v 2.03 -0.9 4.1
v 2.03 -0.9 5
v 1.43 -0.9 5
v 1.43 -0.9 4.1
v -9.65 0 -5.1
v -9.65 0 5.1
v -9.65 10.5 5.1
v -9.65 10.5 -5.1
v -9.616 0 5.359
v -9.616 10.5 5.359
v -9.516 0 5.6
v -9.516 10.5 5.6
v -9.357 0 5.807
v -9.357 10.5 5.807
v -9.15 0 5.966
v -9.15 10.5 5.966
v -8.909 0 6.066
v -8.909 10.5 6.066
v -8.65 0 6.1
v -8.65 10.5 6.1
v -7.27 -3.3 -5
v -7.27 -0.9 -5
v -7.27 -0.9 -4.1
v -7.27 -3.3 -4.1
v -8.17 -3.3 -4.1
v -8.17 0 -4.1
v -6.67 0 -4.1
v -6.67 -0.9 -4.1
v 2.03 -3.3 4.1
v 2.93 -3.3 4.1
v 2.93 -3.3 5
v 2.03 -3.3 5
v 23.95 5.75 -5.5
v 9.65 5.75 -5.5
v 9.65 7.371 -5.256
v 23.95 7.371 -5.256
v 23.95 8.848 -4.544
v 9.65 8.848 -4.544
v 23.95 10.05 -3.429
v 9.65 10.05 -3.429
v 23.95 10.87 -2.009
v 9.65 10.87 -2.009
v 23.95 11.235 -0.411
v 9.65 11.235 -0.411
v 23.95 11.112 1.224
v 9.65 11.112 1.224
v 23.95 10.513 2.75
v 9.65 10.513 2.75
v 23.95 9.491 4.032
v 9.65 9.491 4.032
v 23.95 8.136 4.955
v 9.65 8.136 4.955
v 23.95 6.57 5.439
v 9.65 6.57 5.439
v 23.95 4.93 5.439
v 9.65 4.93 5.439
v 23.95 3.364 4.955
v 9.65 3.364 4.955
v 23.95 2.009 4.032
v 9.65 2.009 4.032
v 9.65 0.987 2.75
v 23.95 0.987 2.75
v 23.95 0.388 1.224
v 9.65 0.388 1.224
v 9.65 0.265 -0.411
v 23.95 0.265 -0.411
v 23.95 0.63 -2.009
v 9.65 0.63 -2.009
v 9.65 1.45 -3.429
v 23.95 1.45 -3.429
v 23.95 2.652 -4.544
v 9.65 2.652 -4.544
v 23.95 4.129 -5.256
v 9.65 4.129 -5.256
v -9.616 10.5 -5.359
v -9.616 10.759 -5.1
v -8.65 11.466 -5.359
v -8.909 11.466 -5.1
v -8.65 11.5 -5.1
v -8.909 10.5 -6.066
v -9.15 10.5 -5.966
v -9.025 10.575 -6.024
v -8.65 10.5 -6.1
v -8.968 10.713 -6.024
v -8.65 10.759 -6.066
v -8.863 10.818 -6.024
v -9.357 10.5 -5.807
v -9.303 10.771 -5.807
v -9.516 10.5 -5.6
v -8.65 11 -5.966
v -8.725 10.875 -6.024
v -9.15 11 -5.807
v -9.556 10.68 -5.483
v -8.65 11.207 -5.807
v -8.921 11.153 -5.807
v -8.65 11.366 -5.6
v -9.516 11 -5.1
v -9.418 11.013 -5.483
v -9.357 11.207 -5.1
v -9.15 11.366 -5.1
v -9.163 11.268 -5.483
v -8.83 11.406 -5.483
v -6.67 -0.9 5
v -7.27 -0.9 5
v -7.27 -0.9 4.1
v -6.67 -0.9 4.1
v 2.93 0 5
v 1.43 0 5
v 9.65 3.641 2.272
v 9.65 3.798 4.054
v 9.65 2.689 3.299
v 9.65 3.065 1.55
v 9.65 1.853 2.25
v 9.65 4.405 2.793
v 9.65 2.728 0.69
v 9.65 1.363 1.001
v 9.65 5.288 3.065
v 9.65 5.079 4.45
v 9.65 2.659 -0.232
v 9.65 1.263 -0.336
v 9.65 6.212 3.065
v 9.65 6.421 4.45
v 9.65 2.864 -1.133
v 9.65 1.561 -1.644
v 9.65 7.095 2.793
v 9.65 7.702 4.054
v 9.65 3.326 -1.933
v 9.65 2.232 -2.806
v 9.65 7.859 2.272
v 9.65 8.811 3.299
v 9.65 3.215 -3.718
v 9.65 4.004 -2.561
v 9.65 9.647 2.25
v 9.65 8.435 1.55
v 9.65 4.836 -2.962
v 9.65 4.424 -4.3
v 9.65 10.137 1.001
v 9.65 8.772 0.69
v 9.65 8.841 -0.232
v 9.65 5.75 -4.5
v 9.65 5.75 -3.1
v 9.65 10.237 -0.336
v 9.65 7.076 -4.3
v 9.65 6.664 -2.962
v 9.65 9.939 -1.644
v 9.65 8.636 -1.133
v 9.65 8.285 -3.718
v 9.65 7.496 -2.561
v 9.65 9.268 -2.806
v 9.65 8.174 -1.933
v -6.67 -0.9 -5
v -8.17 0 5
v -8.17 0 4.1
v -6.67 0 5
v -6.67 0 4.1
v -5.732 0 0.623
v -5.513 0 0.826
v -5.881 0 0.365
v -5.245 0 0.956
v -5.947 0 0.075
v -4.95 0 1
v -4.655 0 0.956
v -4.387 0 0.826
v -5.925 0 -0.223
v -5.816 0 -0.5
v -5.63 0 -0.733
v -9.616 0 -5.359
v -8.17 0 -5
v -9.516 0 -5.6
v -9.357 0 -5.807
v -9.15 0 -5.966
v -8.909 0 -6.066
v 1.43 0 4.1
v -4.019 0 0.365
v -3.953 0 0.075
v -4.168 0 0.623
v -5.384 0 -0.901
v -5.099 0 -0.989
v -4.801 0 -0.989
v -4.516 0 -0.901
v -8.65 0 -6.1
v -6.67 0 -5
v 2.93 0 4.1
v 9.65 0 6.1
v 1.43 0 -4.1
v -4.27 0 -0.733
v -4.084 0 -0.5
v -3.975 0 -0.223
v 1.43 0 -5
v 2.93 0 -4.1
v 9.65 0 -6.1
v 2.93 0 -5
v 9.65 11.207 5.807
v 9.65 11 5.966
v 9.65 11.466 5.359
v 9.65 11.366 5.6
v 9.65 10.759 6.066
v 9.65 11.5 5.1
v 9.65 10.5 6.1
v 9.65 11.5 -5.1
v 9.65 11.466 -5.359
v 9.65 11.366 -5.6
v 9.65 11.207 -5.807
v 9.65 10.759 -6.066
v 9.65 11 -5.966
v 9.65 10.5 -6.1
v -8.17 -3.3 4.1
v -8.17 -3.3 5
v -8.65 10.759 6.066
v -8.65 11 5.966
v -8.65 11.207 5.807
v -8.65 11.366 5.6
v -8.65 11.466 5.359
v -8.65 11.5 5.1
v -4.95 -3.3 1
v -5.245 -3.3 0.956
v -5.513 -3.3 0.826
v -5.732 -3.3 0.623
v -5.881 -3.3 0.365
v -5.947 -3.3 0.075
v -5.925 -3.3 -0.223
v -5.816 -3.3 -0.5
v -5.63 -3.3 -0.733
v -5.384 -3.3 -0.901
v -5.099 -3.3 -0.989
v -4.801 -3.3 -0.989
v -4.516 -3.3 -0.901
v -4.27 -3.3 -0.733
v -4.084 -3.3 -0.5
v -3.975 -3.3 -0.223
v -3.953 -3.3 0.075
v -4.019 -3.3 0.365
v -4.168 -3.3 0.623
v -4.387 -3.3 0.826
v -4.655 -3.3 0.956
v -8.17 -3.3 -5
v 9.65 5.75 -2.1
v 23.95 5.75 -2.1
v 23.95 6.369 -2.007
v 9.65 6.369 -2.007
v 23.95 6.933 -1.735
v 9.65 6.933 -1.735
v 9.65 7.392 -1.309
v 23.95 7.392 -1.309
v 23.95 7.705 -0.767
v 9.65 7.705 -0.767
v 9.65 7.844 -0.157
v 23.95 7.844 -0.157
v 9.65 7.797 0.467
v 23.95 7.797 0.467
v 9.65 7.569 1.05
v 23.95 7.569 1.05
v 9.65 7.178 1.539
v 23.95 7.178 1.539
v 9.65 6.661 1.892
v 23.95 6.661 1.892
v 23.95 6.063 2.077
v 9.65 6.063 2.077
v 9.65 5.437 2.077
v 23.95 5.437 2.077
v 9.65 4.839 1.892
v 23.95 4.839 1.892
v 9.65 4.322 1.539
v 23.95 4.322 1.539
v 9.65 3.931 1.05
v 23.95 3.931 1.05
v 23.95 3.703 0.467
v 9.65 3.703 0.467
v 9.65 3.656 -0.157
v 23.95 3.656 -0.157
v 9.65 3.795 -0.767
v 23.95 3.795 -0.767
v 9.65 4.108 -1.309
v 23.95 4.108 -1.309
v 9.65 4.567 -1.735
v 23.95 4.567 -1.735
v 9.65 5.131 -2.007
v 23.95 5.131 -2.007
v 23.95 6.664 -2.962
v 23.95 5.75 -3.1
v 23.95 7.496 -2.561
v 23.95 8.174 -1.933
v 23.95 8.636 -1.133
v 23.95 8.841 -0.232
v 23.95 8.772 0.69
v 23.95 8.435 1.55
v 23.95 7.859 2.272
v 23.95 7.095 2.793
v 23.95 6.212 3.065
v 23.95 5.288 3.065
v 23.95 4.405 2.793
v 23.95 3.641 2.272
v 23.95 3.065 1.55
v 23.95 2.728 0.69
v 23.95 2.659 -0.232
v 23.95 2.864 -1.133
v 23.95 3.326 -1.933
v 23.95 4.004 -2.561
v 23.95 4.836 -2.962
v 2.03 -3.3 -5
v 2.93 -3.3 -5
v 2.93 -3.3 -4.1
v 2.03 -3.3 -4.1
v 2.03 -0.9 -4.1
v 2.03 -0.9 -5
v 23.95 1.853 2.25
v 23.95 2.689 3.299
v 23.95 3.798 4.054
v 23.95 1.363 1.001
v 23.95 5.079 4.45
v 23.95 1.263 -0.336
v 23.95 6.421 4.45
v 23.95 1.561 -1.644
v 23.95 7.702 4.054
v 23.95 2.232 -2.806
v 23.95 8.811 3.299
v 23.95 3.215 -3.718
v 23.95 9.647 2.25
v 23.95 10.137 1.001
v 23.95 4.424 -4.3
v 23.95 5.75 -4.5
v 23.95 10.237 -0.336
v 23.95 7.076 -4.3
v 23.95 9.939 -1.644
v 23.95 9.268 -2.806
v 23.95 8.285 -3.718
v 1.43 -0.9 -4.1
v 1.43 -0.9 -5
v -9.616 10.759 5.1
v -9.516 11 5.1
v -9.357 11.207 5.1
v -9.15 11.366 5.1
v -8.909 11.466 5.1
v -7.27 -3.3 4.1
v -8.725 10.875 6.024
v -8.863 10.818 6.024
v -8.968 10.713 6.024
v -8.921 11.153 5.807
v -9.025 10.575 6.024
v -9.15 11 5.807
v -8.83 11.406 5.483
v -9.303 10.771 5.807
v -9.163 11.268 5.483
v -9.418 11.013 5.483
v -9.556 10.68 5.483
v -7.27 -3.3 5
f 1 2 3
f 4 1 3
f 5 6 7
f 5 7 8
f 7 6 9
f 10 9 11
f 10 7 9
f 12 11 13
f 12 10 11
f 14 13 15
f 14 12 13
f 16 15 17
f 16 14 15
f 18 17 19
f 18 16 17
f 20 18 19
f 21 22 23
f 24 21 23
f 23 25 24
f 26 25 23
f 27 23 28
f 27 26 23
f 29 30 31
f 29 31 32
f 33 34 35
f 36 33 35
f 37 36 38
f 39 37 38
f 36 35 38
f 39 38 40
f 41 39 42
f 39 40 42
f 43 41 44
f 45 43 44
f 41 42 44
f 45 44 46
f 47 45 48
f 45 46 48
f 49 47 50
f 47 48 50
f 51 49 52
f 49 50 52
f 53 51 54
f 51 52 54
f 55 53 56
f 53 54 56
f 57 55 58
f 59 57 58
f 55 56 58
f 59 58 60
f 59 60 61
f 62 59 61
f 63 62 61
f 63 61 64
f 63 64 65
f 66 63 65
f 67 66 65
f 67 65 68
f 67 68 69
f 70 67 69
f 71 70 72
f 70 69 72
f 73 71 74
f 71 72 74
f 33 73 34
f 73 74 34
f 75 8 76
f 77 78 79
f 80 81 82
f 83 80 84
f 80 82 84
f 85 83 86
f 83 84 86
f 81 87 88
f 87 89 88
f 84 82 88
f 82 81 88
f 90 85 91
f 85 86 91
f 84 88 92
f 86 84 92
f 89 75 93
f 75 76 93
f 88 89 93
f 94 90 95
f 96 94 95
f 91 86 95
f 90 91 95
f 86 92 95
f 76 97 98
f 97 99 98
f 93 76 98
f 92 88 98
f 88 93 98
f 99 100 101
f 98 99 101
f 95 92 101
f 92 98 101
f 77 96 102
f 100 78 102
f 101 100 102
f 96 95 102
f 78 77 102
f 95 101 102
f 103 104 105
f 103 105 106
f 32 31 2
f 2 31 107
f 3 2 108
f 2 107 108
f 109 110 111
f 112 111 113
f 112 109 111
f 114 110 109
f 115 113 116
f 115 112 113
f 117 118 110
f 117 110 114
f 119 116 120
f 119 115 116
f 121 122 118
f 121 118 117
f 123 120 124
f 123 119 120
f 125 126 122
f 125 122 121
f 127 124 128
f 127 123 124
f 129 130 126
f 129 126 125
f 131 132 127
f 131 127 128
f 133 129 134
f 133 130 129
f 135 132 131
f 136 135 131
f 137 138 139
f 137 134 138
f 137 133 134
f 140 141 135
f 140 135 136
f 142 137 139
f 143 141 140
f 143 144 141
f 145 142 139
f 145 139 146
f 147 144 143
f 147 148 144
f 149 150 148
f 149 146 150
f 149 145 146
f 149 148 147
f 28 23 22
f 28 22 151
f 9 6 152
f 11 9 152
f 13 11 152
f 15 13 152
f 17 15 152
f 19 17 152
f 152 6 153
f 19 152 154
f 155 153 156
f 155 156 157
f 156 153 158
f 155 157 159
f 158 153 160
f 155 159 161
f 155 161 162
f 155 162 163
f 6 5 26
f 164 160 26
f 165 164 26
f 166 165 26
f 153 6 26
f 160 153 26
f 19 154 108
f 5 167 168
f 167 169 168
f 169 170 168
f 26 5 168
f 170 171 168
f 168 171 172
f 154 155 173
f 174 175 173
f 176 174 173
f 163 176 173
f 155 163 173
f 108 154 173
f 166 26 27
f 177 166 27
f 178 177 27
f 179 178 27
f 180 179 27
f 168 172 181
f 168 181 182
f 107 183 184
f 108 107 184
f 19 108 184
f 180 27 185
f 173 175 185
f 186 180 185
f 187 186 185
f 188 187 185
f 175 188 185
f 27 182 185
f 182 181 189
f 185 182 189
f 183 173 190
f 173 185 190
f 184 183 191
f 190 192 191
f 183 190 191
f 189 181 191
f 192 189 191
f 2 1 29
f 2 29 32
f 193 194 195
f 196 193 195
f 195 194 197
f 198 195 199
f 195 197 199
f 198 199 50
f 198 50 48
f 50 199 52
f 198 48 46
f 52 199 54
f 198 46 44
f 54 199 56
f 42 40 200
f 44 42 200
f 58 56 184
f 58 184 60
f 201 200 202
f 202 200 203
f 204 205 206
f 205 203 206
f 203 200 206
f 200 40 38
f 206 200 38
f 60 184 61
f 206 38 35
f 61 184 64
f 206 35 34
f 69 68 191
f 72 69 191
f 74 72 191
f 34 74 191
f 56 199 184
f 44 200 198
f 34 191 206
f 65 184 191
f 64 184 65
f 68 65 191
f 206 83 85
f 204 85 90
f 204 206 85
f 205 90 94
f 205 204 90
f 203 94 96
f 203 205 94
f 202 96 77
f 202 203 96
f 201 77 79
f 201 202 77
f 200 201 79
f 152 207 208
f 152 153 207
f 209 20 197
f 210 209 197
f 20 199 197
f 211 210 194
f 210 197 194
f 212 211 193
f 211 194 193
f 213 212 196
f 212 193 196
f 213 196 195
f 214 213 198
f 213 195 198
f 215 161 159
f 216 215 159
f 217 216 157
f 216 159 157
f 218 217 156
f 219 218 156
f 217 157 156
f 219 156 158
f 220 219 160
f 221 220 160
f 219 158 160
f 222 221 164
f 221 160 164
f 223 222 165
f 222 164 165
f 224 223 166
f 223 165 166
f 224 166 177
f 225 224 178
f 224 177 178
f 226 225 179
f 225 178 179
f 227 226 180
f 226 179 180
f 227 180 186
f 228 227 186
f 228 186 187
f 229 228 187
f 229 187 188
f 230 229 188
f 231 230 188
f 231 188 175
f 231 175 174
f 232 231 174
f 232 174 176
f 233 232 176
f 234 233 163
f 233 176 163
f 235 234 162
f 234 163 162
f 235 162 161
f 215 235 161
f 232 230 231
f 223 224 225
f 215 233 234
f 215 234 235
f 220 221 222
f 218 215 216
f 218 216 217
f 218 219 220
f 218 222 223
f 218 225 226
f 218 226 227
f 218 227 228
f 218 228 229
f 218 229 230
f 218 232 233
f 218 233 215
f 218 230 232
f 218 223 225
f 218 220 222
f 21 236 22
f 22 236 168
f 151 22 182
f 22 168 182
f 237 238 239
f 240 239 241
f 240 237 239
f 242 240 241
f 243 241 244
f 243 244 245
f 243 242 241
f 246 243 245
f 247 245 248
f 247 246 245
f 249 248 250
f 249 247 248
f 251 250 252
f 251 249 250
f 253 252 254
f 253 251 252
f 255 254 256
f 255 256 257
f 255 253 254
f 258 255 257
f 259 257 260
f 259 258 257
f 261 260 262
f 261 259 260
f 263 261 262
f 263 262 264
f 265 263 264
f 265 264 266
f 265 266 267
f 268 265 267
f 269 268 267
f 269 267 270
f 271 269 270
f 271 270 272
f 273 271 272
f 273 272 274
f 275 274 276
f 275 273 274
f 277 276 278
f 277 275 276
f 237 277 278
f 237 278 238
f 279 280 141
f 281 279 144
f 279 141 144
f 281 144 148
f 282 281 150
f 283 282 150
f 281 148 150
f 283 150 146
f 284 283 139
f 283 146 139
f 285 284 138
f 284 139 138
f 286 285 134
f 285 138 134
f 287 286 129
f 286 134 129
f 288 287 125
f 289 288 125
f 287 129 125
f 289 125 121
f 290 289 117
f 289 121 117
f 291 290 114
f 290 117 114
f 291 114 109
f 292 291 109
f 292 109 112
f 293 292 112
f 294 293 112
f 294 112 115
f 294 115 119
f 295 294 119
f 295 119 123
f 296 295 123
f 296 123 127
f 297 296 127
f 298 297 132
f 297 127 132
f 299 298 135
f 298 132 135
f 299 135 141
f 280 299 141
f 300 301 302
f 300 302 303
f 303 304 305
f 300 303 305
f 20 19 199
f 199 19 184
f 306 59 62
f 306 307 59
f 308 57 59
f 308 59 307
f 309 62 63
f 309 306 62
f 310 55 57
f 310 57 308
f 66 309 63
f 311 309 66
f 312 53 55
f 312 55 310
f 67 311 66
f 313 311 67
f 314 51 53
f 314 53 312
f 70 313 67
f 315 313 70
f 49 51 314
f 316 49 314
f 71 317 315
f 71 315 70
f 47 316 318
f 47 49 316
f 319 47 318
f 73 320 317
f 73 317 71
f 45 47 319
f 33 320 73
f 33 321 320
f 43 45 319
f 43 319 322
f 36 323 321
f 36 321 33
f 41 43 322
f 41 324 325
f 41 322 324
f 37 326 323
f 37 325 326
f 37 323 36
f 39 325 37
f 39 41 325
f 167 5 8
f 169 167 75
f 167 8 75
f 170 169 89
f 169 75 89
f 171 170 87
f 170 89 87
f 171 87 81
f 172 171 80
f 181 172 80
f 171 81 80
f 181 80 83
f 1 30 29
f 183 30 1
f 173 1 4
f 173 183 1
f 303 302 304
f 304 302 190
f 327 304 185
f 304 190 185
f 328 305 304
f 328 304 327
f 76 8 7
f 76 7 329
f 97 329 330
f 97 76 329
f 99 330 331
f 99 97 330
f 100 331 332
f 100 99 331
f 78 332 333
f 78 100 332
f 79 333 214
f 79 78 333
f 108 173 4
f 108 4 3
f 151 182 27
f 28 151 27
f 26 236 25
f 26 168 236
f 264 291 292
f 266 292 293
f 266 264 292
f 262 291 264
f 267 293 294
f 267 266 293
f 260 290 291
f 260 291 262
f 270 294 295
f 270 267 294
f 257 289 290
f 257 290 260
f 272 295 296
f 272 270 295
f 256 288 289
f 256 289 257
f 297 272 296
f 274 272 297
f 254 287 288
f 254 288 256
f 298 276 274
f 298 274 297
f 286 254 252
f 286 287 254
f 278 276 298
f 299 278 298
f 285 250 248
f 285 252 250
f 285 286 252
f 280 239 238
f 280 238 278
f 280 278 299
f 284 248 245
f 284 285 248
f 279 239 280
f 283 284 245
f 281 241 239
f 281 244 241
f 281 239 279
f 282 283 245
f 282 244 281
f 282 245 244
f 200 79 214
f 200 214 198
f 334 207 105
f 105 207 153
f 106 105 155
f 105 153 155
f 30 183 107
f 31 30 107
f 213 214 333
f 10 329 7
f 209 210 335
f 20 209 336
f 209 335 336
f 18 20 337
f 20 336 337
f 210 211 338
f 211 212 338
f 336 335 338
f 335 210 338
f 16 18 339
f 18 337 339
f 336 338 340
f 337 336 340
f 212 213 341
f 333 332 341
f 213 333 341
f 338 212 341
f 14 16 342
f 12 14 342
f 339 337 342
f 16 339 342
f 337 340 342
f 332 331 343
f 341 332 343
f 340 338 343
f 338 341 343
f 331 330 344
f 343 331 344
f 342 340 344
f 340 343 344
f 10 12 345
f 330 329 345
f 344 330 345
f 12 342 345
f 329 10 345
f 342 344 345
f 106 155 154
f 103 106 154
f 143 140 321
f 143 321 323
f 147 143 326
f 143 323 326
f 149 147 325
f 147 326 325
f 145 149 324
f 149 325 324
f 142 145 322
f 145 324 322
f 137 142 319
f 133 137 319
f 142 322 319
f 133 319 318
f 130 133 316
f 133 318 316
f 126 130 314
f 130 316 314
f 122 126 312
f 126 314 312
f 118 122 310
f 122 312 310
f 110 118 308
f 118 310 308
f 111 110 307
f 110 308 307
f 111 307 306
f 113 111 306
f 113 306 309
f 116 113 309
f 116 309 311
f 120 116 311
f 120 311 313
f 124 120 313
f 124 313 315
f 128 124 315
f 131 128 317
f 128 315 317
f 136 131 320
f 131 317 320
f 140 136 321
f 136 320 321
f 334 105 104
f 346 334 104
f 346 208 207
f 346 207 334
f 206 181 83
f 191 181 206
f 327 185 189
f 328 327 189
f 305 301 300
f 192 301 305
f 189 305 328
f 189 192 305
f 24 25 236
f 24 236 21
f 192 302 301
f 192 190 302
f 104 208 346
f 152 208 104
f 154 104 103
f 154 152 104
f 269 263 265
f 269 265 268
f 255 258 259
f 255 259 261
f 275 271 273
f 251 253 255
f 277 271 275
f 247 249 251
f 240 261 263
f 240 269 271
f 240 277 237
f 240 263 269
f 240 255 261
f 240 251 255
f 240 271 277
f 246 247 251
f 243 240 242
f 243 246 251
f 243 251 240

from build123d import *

# Parameters (mm, degrees)
SKETCH_1_W               = 19.3
SKETCH_1_H               = 12.2
EXTRUDE_1_DEPTH          = 11.5
FILLET_4_R               = 1
SKETCH_2_R               = 5.5
EXTRUDE_2_DEPTH          = 14.3
SKETCH_3_R               = 4.5
CUT_EXTRUDE_1_DEPTH      = 14.3
SKETCH_4_R               = 3.1
SKETCH_4_R_2             = 2.1
EXTRUDE_3_DEPTH          = 14.3
SKETCH_5_W               = 1.5
SKETCH_5_H               = 0.9
EXTRUDE_4_DEPTH          = 0.9
SKETCH_6_W               = 0.9
SKETCH_6_H               = 0.9
EXTRUDE_5_DEPTH          = 2.4
PATTERN_LINEAR_1_COUNT   = 2
PATTERN_LINEAR_1_PITCH   = 9.1
MIRROR_1_COPY_1_SKETCH_W = 1.5
MIRROR_1_COPY_1_SKETCH_H = 0.9
MIRROR_1_COPY_1_DEPTH    = 0.9
MIRROR_1_COPY_2_SKETCH_W = 0.9
MIRROR_1_COPY_2_SKETCH_H = 0.9
MIRROR_1_COPY_2_DEPTH    = 2.4
SKETCH_7_R               = 1
EXTRUDE_6_DEPTH          = 3.3


with BuildPart() as part:
    # Эскиз1 → Бобышка-Вытянуть1 (new body)
    with BuildSketch(Plane(origin=(0, 0, 0), x_dir=(1, 0, 0), z_dir=(0, 1, 0))):
        Rectangle(SKETCH_1_W, SKETCH_1_H)
    extrude(amount=EXTRUDE_1_DEPTH)

    # Скругление4
    fillet_4_edges = [part.edges().sort_by_distance(p)[0] for p in [
        (-9.65, 11.5, 0),
        (0, 11.5, 6.1),
        (-9.65, 5.75, 6.1),
        (-9.65, 5.75, -6.1),
        (0, 11.5, -6.1),
    ]]
    fillet(fillet_4_edges, radius=FILLET_4_R)

    # Эскиз2 → Бобышка-Вытянуть2 (add)
    with BuildSketch(Plane(origin=(9.65, 0, 0), x_dir=(0, 0, -1), z_dir=(1, 0, 0))):
        with Locations((0, 5.75)):
            Circle(SKETCH_2_R)
    extrude(amount=EXTRUDE_2_DEPTH)

    # Эскиз3 → Вырез-Вытянуть1 (cut)
    with BuildSketch(Plane(origin=(23.95, 0, 0), x_dir=(0, 0, -1), z_dir=(1, 0, 0))):
        with Locations((0, 5.75)):
            Circle(SKETCH_3_R)
    extrude(amount=-CUT_EXTRUDE_1_DEPTH, mode=Mode.SUBTRACT)

    # Эскиз4 → Бобышка-Вытянуть3 (add)
    with BuildSketch(Plane(origin=(9.65, 0, 0), x_dir=(0, 0, -1), z_dir=(1, 0, 0))):
        with Locations((0, 5.75)):
            Circle(SKETCH_4_R)
        with Locations((0, 5.75)):
            Circle(SKETCH_4_R_2, mode=Mode.SUBTRACT)
    extrude(amount=EXTRUDE_3_DEPTH)

    # Эскиз5 → Бобышка-Вытянуть4 (add)
    with BuildSketch(Plane.XZ):
        with Locations((-7.42, 4.55)):
            Rectangle(SKETCH_5_W, SKETCH_5_H)
    extrude_4 = extrude(amount=EXTRUDE_4_DEPTH)

    # Эскиз6 → Бобышка-Вытянуть5 (add)
    with BuildSketch(Plane.XZ.offset(0.9)):
        with Locations((-7.72, 4.55)):
            Rectangle(SKETCH_6_W, SKETCH_6_H)
    extrude_5 = extrude(amount=EXTRUDE_5_DEPTH)

    # Линейный массив1: Бобышка-Вытянуть4, Бобышка-Вытянуть5 ×2
    with Locations(*[(0, 0, -i * PATTERN_LINEAR_1_PITCH) for i in range(1, PATTERN_LINEAR_1_COUNT)]):
        add(extrude_4)
        add(extrude_5)

    # Зеркальное отражение1: Бобышка-Вытянуть4, Бобышка-Вытянуть5 across plane
    add(extrude_4.mirror(Plane(origin=(-2.62, 0, 0), x_dir=(0, 0, 1), z_dir=(1, 0, 0))))
    add(extrude_5.mirror(Plane(origin=(-2.62, 0, 0), x_dir=(0, 0, 1), z_dir=(1, 0, 0))))

    # Зеркальное отражение1 copy 1 sketch → Зеркальное отражение1 copy 1 (add)
    with BuildSketch(Plane(origin=(-5.24, 0, -9.1), x_dir=(-1, 0, 0), z_dir=(0, -1, 0))):
        with Locations((-7.42, -4.55)):
            Rectangle(MIRROR_1_COPY_1_SKETCH_W, MIRROR_1_COPY_1_SKETCH_H)
    extrude(amount=MIRROR_1_COPY_1_DEPTH)

    # Зеркальное отражение1 copy 2 sketch → Зеркальное отражение1 copy 2 (add)
    with BuildSketch(Plane(origin=(-5.24, -0.9, -9.1), x_dir=(-1, 0, 0), z_dir=(0, -1, 0))):
        with Locations((-7.72, -4.55)):
            Rectangle(MIRROR_1_COPY_2_SKETCH_W, MIRROR_1_COPY_2_SKETCH_H)
    extrude(amount=MIRROR_1_COPY_2_DEPTH)

    # Эскиз7 → Бобышка-Вытянуть6 (add)
    with BuildSketch(Plane.XZ):
        with Locations(Location((-4.95, 0, 0), (0, 0, 90))):
            Circle(SKETCH_7_R)
    extrude(amount=EXTRUDE_6_DEPTH)


solid = part.part
